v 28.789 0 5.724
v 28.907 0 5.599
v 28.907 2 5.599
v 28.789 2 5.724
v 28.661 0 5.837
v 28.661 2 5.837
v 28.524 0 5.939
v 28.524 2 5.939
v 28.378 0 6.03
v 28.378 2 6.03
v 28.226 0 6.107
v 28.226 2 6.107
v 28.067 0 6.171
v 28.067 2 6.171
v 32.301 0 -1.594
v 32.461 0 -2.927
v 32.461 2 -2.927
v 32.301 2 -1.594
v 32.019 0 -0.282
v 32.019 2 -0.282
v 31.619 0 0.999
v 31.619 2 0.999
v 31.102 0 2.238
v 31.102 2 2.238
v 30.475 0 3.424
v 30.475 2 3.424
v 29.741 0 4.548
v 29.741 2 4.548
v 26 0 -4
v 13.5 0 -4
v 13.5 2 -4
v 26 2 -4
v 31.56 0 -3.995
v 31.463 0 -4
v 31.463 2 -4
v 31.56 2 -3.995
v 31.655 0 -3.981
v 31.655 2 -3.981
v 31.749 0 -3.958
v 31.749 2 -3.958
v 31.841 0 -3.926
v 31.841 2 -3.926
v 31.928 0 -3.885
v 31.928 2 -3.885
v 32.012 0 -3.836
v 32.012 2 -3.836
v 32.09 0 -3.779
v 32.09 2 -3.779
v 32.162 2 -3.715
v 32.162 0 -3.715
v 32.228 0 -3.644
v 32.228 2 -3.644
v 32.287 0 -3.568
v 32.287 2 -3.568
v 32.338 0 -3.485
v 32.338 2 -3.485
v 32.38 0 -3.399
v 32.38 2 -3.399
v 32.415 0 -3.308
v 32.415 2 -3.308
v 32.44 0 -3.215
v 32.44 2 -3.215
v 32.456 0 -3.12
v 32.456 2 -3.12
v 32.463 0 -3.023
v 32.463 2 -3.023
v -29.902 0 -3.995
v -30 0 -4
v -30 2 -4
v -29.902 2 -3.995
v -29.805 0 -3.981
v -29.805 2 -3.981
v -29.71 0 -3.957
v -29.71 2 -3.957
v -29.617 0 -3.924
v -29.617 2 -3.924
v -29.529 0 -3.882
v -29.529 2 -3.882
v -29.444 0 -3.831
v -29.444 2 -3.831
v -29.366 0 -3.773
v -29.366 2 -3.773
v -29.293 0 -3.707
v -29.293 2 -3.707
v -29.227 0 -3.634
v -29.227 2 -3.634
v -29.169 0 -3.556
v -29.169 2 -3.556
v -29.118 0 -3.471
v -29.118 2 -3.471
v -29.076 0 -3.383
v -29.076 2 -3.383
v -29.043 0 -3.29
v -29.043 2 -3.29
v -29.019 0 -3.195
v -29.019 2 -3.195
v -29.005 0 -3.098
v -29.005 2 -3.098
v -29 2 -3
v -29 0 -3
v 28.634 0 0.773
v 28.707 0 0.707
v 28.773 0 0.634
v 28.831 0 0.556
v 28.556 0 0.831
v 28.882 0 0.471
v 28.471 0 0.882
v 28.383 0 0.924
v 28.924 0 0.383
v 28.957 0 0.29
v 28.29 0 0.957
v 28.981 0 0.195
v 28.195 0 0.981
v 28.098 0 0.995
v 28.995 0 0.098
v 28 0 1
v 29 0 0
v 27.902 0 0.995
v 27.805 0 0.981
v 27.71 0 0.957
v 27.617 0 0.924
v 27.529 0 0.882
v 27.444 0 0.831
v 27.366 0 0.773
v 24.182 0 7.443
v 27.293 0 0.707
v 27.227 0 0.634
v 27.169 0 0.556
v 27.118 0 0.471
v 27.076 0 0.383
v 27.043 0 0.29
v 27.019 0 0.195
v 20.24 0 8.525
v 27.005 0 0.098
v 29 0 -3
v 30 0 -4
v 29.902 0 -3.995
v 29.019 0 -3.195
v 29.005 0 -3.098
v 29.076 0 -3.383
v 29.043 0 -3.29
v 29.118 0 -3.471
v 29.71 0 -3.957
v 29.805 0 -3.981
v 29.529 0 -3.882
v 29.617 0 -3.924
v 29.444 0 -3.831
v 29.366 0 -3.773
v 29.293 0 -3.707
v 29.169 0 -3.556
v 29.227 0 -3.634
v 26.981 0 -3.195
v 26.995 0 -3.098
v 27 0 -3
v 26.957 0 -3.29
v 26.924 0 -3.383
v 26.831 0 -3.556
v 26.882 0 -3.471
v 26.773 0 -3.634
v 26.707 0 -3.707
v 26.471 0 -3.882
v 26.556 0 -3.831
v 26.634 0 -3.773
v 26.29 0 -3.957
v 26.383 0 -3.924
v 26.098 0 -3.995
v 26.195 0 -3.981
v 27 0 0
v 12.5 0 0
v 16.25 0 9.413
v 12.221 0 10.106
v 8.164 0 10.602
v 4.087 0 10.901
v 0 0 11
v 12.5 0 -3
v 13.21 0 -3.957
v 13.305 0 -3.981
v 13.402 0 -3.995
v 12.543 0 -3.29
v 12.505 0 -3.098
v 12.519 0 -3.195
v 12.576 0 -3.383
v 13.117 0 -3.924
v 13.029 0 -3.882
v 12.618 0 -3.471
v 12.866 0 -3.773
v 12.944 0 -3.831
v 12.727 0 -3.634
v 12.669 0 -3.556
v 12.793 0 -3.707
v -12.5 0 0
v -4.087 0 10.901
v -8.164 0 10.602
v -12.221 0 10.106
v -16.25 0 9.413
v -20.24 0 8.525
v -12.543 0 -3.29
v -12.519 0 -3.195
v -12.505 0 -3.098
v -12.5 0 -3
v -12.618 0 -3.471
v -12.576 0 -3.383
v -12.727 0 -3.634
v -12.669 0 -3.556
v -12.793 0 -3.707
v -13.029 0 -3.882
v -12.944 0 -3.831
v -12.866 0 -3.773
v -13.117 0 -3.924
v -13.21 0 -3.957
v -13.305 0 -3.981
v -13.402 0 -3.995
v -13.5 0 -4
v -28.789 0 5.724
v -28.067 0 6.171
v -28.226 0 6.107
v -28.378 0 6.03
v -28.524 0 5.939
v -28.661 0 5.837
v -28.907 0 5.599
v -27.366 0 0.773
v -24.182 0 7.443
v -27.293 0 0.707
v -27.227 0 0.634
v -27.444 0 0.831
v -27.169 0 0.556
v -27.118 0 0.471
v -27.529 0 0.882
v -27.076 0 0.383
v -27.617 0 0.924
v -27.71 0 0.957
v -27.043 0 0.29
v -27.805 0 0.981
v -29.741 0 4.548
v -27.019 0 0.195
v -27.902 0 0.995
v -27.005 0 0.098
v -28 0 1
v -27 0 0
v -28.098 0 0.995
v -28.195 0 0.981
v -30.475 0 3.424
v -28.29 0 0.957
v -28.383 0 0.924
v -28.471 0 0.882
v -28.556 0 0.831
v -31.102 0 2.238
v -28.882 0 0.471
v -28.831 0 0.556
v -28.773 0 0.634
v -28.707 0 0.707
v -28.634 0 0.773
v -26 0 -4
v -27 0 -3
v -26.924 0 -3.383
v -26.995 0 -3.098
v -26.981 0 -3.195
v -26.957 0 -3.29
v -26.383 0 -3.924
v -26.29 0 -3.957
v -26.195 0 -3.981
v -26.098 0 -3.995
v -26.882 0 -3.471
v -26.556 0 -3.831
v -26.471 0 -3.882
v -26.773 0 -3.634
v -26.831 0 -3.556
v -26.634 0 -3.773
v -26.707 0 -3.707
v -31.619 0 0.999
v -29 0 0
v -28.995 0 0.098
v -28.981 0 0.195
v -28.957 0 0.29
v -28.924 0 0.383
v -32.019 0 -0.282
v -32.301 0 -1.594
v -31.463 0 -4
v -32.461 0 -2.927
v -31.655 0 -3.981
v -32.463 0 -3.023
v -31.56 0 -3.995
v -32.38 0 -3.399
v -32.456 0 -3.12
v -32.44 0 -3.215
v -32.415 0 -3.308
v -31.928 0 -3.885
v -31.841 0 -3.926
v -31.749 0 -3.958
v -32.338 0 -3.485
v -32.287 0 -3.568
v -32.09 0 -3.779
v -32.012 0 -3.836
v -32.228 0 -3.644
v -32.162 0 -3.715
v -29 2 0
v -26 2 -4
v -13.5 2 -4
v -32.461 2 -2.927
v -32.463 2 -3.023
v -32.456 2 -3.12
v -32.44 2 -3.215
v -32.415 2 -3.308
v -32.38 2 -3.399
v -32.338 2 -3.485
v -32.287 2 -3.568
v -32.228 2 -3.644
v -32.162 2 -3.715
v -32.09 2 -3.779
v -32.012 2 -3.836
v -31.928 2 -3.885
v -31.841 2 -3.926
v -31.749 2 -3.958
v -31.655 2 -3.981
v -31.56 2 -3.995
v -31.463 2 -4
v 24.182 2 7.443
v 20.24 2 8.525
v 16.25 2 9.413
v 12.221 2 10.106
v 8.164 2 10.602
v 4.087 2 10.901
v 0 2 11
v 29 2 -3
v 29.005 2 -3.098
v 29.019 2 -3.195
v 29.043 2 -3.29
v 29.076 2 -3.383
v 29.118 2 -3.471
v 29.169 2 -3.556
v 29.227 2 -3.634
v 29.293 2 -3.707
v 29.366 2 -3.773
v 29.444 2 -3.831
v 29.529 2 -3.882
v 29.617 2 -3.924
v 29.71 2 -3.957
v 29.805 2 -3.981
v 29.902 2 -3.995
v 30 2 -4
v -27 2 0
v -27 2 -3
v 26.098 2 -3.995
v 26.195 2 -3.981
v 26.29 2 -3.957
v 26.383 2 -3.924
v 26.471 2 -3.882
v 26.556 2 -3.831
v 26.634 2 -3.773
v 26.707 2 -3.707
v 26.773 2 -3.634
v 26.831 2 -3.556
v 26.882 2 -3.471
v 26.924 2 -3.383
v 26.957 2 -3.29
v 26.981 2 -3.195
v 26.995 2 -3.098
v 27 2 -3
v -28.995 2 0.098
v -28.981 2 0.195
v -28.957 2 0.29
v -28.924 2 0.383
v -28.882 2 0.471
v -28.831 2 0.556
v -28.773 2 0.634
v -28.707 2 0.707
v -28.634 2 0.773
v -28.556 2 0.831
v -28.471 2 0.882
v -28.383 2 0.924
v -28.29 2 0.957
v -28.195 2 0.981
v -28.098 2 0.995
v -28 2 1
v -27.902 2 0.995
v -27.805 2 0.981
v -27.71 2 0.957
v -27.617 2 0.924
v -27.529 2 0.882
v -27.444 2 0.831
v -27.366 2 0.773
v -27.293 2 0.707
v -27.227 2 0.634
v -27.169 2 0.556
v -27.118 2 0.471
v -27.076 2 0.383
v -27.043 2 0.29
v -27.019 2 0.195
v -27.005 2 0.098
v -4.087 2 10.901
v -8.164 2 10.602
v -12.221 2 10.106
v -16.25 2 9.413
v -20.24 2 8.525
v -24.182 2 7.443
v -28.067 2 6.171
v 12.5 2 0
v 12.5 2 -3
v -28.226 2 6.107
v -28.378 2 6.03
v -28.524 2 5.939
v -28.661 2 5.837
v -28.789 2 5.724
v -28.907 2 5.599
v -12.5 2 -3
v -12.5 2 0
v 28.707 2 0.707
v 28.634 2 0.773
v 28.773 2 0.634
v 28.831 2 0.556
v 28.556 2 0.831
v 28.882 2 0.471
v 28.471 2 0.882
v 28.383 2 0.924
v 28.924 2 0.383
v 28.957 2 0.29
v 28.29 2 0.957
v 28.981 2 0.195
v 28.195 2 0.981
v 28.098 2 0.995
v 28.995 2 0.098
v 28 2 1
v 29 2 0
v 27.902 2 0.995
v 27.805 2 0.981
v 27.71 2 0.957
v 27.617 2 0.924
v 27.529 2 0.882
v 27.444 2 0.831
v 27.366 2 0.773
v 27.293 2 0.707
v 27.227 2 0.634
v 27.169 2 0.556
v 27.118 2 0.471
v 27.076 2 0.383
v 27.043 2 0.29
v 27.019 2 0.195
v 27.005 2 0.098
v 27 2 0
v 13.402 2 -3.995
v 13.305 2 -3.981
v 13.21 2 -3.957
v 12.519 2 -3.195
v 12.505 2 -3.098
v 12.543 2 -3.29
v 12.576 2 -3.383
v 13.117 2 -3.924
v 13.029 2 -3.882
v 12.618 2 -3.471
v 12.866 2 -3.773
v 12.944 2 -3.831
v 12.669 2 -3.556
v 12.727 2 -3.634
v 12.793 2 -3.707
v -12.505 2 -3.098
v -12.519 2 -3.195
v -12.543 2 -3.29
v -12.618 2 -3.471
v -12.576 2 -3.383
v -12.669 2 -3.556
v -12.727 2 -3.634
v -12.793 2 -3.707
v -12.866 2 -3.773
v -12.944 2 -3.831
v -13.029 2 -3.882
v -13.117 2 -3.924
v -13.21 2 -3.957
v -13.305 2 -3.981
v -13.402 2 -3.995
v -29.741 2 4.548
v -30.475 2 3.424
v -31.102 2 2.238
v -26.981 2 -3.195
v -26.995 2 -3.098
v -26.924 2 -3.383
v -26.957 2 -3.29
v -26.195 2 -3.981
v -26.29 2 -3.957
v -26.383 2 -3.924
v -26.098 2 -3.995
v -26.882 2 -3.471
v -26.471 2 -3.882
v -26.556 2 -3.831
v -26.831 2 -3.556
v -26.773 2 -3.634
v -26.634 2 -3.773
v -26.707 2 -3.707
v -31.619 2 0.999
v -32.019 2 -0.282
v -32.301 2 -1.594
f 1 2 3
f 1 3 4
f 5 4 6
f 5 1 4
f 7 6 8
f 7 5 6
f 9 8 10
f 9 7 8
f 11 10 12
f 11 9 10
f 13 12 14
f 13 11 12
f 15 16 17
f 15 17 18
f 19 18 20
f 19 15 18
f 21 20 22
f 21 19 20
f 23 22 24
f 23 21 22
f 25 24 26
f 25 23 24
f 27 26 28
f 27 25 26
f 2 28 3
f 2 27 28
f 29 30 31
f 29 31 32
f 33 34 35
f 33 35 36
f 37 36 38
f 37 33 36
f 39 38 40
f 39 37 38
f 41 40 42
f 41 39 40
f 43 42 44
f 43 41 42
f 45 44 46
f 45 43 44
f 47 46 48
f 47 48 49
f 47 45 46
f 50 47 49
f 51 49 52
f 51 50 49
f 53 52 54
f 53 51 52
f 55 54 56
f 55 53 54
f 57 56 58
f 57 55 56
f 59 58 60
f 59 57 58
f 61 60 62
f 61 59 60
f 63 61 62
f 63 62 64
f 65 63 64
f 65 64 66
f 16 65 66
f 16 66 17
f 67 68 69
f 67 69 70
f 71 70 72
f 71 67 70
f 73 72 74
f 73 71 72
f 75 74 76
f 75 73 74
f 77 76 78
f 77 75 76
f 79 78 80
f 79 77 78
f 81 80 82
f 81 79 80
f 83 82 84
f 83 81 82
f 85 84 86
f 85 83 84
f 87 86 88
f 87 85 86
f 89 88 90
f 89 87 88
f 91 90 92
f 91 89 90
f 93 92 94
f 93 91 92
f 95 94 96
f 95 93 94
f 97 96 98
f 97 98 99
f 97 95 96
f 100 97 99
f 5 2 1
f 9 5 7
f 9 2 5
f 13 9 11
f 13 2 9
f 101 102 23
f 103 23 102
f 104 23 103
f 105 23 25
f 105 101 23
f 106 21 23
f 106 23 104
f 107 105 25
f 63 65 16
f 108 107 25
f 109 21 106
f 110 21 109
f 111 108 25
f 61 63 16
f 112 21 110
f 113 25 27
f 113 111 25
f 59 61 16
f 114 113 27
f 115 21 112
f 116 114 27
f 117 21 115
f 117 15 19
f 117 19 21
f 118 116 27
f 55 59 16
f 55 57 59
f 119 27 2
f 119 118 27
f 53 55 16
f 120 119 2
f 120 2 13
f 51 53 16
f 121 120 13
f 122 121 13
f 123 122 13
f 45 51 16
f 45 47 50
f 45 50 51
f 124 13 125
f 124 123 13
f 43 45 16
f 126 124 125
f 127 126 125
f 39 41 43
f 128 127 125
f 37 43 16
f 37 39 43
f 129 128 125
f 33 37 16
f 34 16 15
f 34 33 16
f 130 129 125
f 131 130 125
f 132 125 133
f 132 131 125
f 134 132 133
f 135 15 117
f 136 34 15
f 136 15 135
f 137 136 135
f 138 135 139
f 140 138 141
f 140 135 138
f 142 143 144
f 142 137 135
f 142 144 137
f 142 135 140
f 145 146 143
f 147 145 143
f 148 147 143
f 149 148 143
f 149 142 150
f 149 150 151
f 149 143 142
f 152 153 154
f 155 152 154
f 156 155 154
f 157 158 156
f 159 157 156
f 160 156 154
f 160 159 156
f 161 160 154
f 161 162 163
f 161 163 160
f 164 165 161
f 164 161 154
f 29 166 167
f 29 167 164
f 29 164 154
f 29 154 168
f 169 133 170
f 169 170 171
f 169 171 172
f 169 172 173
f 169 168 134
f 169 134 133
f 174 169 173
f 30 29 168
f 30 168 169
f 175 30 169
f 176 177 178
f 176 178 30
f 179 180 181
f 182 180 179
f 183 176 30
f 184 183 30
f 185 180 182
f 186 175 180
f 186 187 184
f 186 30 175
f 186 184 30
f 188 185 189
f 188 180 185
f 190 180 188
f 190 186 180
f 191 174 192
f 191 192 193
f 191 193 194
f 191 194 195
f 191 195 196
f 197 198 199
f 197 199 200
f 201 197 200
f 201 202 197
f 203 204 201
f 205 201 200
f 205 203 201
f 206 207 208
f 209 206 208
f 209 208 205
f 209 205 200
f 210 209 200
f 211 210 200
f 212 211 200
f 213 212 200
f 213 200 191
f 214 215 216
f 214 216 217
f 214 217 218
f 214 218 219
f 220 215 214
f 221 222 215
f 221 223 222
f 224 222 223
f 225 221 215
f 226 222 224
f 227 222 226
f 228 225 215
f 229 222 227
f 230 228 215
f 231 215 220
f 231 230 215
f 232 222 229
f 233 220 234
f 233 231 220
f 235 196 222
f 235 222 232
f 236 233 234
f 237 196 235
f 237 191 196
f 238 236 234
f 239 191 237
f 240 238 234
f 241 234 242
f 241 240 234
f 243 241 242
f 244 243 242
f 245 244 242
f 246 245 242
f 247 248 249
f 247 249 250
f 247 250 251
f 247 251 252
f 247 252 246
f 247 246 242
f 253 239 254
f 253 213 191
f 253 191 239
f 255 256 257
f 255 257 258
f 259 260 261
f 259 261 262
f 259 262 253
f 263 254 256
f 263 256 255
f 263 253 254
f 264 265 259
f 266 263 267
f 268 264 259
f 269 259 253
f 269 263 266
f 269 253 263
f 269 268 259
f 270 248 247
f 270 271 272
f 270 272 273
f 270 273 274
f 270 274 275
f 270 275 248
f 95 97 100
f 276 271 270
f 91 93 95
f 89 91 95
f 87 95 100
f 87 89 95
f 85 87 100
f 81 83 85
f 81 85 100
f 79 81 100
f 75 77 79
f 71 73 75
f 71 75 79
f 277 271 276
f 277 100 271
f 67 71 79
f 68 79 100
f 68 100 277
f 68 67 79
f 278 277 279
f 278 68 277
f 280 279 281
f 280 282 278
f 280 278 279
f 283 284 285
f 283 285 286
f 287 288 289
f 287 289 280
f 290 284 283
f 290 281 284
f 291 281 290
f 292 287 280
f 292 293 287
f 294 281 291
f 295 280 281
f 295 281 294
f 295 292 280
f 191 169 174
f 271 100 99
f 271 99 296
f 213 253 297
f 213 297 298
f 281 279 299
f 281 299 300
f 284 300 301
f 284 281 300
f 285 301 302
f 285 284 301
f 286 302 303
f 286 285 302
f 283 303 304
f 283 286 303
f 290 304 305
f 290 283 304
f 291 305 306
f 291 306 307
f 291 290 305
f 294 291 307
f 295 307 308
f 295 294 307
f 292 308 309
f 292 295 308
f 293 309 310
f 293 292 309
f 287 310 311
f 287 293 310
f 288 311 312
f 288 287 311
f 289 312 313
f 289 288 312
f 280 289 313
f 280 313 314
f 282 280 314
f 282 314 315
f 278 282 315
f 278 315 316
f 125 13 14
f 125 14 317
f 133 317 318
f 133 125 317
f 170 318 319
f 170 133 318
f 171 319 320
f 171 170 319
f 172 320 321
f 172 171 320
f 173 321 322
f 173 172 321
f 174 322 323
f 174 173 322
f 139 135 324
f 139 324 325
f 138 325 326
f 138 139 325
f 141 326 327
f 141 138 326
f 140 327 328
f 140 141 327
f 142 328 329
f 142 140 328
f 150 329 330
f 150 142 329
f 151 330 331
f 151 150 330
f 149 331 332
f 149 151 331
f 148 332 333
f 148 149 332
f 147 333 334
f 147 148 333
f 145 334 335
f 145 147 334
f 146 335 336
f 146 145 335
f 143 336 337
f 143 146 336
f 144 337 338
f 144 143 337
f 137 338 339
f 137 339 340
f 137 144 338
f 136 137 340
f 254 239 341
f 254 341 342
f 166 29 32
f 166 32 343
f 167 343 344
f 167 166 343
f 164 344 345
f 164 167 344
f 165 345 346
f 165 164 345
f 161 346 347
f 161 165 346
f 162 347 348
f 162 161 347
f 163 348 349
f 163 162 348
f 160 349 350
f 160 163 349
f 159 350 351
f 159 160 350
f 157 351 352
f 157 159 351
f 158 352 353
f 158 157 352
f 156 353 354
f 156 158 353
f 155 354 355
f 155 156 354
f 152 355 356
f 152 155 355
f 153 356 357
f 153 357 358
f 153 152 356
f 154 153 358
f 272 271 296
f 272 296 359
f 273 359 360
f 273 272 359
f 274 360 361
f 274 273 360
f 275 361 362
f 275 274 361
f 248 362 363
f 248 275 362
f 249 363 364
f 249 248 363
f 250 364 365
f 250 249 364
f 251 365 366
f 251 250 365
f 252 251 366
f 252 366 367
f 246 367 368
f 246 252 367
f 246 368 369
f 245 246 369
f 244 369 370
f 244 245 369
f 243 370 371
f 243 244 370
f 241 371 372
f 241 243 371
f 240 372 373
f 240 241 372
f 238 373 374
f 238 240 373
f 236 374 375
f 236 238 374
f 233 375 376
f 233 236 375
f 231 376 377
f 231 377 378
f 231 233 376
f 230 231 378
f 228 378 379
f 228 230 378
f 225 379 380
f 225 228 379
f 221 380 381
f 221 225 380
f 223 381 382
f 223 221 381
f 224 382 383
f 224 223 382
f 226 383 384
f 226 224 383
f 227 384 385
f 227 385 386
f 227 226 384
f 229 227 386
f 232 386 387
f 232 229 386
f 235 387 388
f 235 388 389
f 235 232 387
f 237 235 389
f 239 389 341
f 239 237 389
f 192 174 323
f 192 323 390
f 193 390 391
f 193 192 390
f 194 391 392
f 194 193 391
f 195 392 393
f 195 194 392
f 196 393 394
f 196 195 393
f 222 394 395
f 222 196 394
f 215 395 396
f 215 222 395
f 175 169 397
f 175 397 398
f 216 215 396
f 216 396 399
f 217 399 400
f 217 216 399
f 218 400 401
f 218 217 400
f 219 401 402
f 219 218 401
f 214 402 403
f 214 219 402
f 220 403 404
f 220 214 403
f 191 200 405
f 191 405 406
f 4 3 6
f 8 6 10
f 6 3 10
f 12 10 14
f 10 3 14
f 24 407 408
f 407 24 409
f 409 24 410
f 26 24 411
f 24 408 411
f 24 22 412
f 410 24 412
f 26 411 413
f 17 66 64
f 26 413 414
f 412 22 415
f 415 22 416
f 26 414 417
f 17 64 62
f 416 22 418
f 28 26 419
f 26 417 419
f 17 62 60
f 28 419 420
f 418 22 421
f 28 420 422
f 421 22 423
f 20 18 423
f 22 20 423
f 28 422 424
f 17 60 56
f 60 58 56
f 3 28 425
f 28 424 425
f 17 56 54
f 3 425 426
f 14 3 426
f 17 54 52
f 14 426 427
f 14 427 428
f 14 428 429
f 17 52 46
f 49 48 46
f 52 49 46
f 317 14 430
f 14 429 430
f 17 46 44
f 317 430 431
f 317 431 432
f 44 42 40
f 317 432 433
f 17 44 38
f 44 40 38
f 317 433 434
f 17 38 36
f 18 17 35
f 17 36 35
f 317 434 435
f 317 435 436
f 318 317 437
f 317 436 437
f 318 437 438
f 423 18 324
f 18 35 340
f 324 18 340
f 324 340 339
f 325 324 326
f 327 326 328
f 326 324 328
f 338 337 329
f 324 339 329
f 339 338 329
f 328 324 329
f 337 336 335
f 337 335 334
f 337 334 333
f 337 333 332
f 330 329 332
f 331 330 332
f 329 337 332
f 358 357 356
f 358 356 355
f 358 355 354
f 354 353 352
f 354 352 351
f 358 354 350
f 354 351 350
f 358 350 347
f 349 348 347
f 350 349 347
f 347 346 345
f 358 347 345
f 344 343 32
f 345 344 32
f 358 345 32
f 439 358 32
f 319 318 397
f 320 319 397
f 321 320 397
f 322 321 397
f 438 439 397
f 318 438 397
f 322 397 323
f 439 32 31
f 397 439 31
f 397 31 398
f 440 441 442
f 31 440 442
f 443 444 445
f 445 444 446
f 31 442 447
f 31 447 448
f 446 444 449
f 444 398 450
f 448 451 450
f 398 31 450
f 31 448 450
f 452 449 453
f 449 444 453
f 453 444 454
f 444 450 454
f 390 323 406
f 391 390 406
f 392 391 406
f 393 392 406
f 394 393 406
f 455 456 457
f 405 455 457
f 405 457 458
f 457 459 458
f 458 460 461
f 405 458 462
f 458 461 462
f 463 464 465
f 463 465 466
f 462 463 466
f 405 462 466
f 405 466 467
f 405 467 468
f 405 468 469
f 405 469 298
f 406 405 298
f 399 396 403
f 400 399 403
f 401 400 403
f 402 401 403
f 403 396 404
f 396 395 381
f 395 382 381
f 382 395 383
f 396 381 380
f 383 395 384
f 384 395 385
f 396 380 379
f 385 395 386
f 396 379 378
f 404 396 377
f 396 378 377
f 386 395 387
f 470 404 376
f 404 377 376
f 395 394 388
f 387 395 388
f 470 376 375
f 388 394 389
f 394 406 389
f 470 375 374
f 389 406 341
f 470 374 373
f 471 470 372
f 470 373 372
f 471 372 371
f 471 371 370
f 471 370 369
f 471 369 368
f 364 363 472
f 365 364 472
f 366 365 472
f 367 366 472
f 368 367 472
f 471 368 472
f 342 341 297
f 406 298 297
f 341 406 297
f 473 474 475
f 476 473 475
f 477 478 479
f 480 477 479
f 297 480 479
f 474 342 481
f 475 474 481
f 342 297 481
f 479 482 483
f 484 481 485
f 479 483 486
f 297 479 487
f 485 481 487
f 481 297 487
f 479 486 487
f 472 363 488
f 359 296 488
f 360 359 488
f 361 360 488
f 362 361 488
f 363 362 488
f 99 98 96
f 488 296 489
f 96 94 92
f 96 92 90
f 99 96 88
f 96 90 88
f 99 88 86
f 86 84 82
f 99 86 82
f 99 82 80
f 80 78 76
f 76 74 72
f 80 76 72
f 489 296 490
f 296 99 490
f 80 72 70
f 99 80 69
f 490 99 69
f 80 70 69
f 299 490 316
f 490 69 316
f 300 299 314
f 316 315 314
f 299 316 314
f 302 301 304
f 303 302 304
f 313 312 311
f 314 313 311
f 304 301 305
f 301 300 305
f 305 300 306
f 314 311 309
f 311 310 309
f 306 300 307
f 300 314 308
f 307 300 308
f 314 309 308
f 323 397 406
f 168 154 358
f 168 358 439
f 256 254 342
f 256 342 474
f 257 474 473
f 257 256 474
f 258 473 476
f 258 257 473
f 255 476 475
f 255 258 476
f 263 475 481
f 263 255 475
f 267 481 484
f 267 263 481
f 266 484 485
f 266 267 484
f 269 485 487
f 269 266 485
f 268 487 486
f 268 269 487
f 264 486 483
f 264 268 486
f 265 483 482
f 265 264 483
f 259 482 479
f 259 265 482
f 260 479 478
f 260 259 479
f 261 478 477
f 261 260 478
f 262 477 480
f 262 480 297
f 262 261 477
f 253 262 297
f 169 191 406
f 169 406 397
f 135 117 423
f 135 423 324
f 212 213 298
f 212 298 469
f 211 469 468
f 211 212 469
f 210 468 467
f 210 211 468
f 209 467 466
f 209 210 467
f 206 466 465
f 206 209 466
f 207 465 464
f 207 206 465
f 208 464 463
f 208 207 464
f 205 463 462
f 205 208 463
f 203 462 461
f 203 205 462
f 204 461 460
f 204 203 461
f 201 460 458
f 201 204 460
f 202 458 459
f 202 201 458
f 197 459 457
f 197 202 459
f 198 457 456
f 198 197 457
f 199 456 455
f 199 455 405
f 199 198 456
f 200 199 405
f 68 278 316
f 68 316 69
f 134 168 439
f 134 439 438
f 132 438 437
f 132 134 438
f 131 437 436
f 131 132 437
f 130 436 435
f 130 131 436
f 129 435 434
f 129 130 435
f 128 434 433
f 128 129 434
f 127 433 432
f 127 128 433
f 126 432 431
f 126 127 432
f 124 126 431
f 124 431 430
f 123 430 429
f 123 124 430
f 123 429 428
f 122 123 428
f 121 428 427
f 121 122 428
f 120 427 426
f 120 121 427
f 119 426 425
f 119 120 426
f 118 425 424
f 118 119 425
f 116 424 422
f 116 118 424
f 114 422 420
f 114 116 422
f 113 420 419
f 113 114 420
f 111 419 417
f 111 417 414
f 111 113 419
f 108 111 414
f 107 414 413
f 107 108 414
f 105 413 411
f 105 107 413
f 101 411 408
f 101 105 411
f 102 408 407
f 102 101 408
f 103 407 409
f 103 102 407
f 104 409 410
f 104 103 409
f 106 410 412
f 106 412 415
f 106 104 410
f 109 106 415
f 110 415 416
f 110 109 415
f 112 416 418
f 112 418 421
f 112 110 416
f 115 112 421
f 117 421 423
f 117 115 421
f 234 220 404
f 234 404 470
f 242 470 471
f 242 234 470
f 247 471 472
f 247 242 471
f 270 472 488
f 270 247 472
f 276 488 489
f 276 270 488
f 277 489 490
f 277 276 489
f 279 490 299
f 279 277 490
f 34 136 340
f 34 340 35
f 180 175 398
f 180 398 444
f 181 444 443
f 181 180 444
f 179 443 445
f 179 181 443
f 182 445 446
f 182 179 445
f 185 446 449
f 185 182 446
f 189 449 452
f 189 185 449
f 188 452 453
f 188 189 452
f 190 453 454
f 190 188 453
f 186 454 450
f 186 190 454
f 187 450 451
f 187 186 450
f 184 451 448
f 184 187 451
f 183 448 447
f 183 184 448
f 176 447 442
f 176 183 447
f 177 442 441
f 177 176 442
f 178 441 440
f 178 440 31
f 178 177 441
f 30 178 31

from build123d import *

# Parameters (mm, degrees)
RESSALTO_EXTRUS_O1_DEPTH = 2


with BuildPart() as part:
    # Esboço1 → Ressalto-extrusão1 (new body)
    with BuildSketch(Plane(origin=(0, 0, 0), x_dir=(1, 0, 0), z_dir=(0, 1, 0))):
        with BuildLine():
            Line((-12.5, 0), (12.5, 0))
            Line((12.5, 0), (12.5, 3))
            ThreePointArc((12.5, 3), (12.792893219, 3.707106781), (13.5, 4))
            Line((13.5, 4), (26, 4))
            ThreePointArc((26, 4), (26.707106781, 3.707106781), (27, 3))
            Line((27, 3), (27, 0))
            ThreePointArc((27, 0), (28, -1), (29, 0))
            Line((29, 0), (29, 3))
            ThreePointArc((29, 3), (29.292893219, 3.707106781), (30, 4))
            Line((30, 4), (31.463239539, 4))
            ThreePointArc((31.463239539, 4), (32.195845062, 3.680653471), (32.460540524, 2.926578296))
            ThreePointArc((32.460540524, 2.926578296), (31.37483832, -1.624378023), (28.907100926, -5.599327689))
            ThreePointArc((28.907100926, -5.599327689), (28.523980806, -5.93948611), (28.067011203, -6.171148708))
            ThreePointArc((28.067011203, -6.171148708), (14.239688573, -9.783983548), (0, -11))
            ThreePointArc((0, -11), (-14.239688573, -9.783983548), (-28.067011203, -6.171148708))
            ThreePointArc((-28.067011203, -6.171148708), (-28.523980806, -5.93948611), (-28.907100926, -5.599327689))
            ThreePointArc((-28.907100926, -5.599327689), (-31.37483832, -1.624378023), (-32.460540524, 2.926578296))
            ThreePointArc((-32.460540524, 2.926578296), (-32.195845062, 3.680653471), (-31.463239539, 4))
            Line((-31.463239539, 4), (-30, 4))
            ThreePointArc((-30, 4), (-29.292893219, 3.707106781), (-29, 3))
            Line((-29, 3), (-29, 0))
            ThreePointArc((-29, 0), (-28, -1), (-27, 0))
            Line((-27, 0), (-27, 3))
            ThreePointArc((-27, 3), (-26.707106781, 3.707106781), (-26, 4))
            Line((-26, 4), (-13.5, 4))
            ThreePointArc((-13.5, 4), (-12.792893219, 3.707106781), (-12.5, 3))
            Line((-12.5, 3), (-12.5, 0))
        make_face()
    extrude(amount=RESSALTO_EXTRUS_O1_DEPTH)


solid = part.part
